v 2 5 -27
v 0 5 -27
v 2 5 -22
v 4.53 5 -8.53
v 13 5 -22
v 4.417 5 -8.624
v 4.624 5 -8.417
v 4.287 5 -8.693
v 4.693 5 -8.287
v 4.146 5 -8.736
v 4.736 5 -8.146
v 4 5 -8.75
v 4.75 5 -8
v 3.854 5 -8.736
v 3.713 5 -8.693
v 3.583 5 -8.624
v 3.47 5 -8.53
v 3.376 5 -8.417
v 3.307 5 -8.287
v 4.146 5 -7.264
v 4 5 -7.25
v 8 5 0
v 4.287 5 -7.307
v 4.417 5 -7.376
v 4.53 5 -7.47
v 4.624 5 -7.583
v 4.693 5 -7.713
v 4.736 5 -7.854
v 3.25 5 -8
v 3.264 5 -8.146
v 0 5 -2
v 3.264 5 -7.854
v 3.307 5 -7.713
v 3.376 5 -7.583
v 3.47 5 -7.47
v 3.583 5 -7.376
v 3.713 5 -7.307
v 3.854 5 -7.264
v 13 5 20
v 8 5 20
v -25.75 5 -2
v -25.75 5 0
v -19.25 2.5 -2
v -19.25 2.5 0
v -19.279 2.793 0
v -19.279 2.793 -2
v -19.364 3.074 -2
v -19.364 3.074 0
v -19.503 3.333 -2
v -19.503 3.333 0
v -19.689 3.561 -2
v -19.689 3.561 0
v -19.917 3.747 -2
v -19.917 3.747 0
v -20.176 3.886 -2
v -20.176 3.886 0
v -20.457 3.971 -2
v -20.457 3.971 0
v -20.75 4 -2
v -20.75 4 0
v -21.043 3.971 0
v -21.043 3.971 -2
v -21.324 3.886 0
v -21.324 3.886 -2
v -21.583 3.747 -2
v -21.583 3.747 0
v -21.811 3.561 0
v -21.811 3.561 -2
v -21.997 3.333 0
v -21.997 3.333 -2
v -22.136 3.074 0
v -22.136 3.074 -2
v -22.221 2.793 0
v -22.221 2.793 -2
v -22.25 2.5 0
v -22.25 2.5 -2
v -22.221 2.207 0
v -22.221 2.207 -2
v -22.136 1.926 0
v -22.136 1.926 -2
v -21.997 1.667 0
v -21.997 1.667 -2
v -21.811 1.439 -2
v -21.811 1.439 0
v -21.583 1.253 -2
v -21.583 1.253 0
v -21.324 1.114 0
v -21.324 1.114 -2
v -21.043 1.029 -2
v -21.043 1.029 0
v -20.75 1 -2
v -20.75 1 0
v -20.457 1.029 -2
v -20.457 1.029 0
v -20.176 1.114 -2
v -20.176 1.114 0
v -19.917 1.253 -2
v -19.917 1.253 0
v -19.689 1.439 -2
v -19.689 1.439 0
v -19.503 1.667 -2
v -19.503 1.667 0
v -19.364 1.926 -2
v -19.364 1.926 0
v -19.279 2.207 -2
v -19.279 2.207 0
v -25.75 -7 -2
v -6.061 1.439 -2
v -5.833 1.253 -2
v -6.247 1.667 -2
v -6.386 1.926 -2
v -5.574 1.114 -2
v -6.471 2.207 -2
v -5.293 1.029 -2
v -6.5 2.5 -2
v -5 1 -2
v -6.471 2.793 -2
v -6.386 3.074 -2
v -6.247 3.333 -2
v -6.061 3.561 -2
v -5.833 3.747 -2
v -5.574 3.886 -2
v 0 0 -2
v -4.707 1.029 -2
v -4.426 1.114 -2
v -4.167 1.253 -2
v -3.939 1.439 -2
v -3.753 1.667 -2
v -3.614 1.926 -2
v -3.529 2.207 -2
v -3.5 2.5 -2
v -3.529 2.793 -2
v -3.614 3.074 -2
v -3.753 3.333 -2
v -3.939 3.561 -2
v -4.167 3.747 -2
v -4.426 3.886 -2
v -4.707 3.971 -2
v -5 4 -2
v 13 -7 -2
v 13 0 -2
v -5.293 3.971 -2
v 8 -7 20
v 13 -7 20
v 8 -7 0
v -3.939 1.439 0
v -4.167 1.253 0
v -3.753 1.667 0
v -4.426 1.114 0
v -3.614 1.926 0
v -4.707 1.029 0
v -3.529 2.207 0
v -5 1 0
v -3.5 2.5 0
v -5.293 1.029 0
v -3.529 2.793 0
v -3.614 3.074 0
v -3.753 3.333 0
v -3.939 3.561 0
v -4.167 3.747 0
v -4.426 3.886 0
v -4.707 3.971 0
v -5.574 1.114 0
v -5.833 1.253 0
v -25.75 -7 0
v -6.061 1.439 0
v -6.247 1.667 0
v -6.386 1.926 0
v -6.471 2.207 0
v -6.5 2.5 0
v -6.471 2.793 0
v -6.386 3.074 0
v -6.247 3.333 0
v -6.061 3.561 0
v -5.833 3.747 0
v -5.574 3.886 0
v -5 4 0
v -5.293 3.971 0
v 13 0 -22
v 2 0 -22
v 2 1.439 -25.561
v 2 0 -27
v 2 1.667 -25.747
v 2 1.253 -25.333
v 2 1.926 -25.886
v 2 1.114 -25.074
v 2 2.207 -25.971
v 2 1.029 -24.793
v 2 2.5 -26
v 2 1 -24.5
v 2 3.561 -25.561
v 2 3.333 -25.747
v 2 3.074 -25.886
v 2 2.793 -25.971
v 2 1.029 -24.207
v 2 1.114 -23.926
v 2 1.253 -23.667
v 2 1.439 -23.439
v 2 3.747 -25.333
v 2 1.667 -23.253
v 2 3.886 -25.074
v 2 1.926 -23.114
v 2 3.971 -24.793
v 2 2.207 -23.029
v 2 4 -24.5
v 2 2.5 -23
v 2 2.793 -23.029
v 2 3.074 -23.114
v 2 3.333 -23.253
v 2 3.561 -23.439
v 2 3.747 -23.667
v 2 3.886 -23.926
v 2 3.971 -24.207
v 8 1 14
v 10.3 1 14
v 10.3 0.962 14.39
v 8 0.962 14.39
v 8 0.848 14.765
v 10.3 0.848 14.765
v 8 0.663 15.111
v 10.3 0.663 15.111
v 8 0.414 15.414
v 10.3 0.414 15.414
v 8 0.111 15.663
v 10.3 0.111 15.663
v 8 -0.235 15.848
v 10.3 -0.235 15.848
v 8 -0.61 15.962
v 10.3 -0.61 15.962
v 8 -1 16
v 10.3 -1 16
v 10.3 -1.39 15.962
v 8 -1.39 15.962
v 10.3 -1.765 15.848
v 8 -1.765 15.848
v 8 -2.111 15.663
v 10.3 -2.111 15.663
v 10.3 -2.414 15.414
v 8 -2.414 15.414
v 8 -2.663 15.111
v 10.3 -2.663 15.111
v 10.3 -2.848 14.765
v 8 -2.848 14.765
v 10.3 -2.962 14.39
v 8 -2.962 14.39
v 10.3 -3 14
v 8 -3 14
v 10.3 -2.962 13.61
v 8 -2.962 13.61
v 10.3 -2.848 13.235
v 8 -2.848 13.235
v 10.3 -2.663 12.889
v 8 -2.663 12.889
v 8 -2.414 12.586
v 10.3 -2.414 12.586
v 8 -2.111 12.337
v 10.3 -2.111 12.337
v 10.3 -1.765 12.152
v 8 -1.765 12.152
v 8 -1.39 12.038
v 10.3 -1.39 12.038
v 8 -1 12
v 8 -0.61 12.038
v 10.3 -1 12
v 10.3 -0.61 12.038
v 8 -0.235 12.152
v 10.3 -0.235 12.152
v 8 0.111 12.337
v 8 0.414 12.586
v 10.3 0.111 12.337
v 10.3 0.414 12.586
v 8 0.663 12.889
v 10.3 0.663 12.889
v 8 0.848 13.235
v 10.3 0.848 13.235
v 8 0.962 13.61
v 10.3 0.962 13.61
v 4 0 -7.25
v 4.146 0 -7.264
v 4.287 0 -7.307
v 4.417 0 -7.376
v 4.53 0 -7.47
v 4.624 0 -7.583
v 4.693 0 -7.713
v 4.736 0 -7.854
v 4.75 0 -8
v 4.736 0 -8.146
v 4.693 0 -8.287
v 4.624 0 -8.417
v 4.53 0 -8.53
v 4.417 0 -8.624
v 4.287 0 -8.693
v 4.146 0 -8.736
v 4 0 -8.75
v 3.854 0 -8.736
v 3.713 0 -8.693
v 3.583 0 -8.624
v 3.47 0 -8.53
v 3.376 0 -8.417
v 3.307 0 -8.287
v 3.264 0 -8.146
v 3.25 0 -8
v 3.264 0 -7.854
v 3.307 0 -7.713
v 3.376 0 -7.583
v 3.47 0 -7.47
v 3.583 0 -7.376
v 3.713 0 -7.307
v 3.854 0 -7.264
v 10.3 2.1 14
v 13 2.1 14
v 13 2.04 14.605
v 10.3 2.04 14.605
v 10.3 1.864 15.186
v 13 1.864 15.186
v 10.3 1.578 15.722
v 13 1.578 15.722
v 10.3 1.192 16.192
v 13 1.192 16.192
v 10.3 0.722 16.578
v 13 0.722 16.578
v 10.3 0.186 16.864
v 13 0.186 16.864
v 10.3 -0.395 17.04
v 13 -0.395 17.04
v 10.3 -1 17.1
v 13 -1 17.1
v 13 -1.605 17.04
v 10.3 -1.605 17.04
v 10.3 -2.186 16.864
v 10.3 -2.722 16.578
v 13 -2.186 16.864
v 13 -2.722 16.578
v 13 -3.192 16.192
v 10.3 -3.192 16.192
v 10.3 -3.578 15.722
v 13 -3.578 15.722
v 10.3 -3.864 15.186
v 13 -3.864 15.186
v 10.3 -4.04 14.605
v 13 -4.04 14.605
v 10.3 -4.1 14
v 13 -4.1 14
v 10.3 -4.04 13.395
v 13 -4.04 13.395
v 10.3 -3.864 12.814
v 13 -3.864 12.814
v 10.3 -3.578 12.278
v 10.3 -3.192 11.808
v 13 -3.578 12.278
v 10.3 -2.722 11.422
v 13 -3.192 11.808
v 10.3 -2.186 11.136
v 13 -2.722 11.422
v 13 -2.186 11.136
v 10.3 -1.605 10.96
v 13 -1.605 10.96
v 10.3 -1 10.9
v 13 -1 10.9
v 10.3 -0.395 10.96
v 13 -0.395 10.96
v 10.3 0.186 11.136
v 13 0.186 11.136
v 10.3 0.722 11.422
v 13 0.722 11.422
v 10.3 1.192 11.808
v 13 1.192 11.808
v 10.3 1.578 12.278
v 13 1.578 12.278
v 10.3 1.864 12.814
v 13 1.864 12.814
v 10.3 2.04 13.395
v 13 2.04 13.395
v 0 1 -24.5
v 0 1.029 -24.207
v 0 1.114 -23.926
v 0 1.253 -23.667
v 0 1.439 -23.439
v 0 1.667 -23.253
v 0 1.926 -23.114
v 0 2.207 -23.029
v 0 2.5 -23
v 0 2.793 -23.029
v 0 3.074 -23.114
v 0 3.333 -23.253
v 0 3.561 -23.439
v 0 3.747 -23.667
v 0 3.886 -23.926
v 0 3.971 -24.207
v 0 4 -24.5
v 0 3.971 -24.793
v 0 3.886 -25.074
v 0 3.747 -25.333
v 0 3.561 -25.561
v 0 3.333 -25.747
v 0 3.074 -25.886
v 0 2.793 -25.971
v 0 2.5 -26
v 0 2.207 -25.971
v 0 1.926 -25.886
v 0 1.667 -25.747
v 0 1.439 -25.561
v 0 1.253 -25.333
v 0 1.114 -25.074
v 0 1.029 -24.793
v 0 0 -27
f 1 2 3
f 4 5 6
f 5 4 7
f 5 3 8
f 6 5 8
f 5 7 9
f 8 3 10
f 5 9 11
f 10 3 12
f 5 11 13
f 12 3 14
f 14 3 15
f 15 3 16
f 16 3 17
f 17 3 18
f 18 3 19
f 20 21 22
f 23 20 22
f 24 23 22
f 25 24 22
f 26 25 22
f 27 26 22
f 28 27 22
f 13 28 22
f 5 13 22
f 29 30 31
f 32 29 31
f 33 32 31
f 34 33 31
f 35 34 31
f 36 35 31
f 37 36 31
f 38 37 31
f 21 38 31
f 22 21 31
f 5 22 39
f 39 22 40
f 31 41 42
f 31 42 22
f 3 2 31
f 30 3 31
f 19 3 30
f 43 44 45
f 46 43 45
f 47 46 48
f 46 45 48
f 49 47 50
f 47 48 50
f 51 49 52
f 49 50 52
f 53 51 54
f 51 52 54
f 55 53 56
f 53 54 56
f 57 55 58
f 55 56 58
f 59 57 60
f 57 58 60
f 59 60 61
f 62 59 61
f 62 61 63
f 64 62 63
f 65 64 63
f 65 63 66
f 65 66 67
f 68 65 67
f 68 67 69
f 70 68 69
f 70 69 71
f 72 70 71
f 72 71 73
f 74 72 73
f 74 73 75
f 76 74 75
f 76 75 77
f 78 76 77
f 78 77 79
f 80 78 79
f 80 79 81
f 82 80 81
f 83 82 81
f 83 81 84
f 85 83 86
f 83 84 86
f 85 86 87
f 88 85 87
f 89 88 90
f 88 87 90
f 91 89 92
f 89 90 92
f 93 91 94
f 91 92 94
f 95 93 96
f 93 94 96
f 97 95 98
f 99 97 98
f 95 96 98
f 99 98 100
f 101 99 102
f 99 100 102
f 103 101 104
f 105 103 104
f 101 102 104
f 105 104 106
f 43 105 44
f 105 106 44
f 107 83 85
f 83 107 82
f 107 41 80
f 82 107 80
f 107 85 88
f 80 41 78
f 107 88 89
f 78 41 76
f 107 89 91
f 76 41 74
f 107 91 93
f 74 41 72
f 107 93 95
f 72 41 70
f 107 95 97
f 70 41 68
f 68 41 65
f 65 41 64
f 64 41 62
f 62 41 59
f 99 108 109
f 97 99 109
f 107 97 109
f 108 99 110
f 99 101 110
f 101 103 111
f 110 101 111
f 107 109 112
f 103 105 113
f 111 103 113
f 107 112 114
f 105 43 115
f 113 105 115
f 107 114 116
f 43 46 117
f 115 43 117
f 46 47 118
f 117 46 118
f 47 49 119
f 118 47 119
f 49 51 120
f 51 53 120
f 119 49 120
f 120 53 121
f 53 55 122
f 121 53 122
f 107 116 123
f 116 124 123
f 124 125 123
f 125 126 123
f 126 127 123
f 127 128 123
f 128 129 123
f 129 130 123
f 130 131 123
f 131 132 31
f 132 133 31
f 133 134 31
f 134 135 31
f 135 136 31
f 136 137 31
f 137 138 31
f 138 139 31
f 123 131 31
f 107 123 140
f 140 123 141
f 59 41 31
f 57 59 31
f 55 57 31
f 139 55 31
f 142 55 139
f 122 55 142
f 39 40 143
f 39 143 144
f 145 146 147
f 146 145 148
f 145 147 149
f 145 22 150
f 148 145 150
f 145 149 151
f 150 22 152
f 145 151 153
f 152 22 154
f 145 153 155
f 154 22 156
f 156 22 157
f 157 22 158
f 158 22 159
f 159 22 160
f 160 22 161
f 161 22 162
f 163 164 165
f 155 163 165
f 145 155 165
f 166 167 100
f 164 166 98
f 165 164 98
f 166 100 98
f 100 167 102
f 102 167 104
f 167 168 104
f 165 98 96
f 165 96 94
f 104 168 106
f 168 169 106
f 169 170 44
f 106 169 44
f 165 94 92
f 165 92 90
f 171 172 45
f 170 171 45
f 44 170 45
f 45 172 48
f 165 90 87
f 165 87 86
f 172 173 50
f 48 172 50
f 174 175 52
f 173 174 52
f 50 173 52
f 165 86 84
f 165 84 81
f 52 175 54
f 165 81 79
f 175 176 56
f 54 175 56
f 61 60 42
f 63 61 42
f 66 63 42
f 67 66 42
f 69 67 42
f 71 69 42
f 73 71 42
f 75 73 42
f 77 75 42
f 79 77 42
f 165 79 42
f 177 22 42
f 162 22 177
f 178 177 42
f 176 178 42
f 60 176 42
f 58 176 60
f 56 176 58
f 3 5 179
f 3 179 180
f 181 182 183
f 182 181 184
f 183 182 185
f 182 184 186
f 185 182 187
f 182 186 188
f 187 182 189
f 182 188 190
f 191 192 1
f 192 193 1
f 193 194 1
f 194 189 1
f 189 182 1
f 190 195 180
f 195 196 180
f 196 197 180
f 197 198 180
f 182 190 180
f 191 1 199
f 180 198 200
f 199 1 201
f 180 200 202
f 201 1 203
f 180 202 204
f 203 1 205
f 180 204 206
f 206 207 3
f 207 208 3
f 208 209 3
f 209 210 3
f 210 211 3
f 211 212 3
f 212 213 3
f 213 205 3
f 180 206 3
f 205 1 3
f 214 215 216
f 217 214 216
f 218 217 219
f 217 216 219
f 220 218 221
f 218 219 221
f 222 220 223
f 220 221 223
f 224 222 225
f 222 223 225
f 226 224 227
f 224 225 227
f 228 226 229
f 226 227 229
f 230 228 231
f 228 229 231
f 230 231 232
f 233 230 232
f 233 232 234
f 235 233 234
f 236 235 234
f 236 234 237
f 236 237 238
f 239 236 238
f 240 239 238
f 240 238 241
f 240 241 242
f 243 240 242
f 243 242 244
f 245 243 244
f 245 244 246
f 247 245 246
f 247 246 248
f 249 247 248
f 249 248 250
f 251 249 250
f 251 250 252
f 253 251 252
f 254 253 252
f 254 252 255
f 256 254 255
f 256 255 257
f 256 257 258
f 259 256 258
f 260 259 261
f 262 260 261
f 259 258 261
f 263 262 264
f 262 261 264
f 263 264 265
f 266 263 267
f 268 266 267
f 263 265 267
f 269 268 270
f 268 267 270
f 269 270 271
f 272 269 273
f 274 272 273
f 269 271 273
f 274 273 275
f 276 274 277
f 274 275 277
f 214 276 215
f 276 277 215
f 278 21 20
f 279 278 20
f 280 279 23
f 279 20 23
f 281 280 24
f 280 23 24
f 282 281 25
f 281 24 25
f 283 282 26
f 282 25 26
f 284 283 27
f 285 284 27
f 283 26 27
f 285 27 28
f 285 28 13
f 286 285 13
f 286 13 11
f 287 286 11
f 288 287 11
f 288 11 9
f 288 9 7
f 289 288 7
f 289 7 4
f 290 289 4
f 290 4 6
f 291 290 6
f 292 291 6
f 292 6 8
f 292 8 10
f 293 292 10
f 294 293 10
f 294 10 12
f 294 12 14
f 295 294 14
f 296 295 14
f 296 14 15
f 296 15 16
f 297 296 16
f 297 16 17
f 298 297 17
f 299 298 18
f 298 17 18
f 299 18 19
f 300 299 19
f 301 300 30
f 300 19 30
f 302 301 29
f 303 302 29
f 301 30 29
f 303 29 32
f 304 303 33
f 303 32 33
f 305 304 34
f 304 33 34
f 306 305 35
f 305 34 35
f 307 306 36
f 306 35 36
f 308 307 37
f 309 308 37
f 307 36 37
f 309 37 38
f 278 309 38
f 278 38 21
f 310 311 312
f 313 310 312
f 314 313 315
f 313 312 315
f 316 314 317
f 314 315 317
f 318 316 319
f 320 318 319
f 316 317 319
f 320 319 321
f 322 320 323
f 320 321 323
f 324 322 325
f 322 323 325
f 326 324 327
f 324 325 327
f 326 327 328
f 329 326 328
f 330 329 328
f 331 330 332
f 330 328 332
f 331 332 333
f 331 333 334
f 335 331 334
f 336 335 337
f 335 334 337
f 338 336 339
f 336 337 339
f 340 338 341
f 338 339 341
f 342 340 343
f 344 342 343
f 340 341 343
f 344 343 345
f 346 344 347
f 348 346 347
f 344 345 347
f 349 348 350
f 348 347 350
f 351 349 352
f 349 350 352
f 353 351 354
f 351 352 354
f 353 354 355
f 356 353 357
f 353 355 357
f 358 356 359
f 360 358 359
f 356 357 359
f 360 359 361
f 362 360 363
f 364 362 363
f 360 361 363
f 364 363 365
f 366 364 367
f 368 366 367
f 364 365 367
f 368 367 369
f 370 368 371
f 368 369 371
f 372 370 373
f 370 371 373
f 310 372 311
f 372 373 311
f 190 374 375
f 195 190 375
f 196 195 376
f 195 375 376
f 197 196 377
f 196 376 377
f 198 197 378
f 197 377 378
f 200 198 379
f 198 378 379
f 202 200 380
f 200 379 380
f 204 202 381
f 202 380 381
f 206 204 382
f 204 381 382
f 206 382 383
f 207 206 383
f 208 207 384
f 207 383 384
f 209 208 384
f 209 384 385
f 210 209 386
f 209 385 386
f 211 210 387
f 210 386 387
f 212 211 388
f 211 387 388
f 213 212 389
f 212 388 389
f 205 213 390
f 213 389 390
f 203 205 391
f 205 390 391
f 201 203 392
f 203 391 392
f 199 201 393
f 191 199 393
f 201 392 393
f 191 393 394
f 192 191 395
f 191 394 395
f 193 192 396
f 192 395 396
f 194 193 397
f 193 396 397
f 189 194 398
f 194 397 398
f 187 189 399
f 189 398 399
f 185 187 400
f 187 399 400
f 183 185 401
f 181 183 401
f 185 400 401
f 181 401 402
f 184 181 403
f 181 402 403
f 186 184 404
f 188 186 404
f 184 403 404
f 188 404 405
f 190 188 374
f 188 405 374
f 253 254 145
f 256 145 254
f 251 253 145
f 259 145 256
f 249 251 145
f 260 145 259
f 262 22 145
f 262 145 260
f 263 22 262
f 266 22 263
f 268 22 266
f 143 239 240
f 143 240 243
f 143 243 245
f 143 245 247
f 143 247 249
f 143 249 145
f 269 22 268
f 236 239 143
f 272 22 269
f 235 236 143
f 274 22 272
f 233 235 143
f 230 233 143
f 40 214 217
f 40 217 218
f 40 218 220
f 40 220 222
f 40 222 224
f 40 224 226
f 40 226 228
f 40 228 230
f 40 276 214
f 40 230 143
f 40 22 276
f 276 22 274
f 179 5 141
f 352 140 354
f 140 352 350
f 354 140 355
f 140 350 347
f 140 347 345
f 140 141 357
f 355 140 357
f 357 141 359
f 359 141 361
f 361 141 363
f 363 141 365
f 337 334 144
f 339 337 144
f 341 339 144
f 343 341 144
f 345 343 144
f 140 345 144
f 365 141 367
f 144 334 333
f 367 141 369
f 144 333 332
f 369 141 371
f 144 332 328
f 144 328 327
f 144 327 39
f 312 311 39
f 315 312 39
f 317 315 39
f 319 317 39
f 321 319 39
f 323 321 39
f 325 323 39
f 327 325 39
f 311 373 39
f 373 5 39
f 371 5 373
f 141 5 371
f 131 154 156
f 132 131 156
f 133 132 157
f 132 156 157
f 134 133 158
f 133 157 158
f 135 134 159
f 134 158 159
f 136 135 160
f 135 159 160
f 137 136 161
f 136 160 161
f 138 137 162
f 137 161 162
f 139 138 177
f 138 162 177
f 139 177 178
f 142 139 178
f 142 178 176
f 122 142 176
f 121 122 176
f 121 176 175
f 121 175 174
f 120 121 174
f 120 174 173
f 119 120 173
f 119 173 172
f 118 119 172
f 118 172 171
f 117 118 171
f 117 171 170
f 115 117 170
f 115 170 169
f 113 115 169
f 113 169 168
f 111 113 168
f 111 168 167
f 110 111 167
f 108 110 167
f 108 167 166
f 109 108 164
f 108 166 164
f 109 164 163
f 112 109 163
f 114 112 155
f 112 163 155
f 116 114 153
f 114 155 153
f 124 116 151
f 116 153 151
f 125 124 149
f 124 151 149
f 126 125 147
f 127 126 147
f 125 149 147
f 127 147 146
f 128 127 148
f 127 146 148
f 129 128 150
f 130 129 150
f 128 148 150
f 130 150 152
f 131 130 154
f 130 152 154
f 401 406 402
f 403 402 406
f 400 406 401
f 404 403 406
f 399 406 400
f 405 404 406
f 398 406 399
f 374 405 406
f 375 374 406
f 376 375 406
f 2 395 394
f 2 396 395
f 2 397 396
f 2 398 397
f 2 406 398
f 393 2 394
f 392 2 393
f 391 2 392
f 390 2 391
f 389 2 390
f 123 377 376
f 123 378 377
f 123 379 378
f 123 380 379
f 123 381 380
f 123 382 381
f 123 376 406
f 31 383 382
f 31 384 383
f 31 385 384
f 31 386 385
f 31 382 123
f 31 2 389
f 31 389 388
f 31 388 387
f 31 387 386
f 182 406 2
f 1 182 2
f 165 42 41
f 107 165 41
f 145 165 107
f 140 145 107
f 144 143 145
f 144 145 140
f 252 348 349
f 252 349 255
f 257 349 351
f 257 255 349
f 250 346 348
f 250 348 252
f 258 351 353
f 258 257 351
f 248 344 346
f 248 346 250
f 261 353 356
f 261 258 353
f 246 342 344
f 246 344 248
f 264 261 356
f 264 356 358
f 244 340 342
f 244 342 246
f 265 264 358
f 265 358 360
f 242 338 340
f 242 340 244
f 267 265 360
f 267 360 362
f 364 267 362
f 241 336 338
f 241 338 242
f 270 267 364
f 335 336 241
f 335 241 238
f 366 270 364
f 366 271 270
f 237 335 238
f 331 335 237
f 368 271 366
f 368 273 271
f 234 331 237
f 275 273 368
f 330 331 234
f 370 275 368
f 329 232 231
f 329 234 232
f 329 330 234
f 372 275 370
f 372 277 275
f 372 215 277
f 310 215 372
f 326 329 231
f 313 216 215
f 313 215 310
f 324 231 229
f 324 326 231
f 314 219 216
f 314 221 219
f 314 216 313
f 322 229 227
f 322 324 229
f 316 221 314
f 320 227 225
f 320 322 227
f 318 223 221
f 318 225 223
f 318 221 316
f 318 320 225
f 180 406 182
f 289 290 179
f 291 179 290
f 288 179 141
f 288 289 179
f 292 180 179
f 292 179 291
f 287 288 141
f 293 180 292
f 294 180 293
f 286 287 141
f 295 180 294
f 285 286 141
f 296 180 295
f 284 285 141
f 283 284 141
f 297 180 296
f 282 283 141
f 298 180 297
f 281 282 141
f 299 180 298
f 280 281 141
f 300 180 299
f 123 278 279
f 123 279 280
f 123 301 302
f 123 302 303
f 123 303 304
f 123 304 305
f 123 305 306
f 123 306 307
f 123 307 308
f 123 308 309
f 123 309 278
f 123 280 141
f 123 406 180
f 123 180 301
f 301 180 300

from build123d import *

# Parameters (mm, degrees)
SKETCH_1_W          = 25.75
SKETCH_1_H          = 2
EXTRUDE_1_DEPTH     = 5
SKETCH_2_W          = 13
SKETCH_2_H          = 5
EXTRUDE_2_DEPTH     = 22
SKETCH_2_3_W        = 5
SKETCH_2_3_H        = 5
EXTRUDE_3_DEPTH     = 20
SKETCH_3_W          = 5
SKETCH_3_H          = 20
EXTRUDE_4_DEPTH     = 7
SKETCH_4_R          = 2
CUT_EXTRUDE_1_DEPTH = 46.106124861
SKETCH_4_3_R        = 3.1
CUT_EXTRUDE_2_DEPTH = 2.7
SKETCH_5_W          = 5
SKETCH_5_H          = 5
SKETCH_5_R          = 1.5
EXTRUDE_5_DEPTH     = 2
SKETCH_6_R          = 1.5
CUT_EXTRUDE_3_DEPTH = 38.961329007
SKETCH_7_R          = 0.75
CUT_EXTRUDE_4_DEPTH = 40.192633236


with BuildPart() as part:
    # 草图1 → 凸台-拉伸1 (new body)
    with BuildSketch(Plane(origin=(0, 0, 0), x_dir=(1, 0, 0), z_dir=(0, 1, 0))):
        with Locations((-12.875, 1)):
            Rectangle(SKETCH_1_W, SKETCH_1_H)
    extrude(amount=EXTRUDE_1_DEPTH)

    # 草图2 → 凸台-拉伸2 (add)
    with BuildSketch(Plane(origin=(0, 0, 0), x_dir=(-1, 0, 0), z_dir=(0, 0, -1))):
        with Locations((-6.5, 2.5)):
            Rectangle(SKETCH_2_W, SKETCH_2_H)
    extrude(amount=EXTRUDE_2_DEPTH)

    # 草图2<3> → 凸台-拉伸3 (add)
    with BuildSketch(Plane(origin=(0, 0, 0), x_dir=(-1, 0, 0), z_dir=(0, 0, -1))):
        with Locations((-10.5, 2.5)):
            Rectangle(SKETCH_2_3_W, SKETCH_2_3_H)
    extrude(amount=-EXTRUDE_3_DEPTH)

    # 草图3 → 凸台-拉伸4 (add)
    with BuildSketch(Plane.XZ):
        Polygon((8, 0), (-25.75, 0), (-25.75, -2), (13, -2), (13, 0), align=None)
        with Locations((10.5, 10)):
            Rectangle(SKETCH_3_W, SKETCH_3_H)
    extrude(amount=EXTRUDE_4_DEPTH)

    # 草图4 → 切除-拉伸1 (cut, through all)
    with BuildSketch(Plane(origin=(13, 0, 0), x_dir=(0, 0, -1), z_dir=(1, 0, 0))):
        with Locations((-14, -1)):
            Circle(SKETCH_4_R)
    extrude(amount=-CUT_EXTRUDE_1_DEPTH, mode=Mode.SUBTRACT)

    # 草图4<3> → 切除-拉伸2 (cut)
    with BuildSketch(Plane(origin=(13, 0, 0), x_dir=(0, 0, -1), z_dir=(1, 0, 0))):
        with Locations((-14, -1)):
            Circle(SKETCH_4_3_R)
    extrude(amount=-CUT_EXTRUDE_2_DEPTH, mode=Mode.SUBTRACT)

    # 草图5 → 凸台-拉伸5 (add)
    with BuildSketch(Plane.ZY):
        with Locations((-24.5, 2.5)):
            Rectangle(SKETCH_5_W, SKETCH_5_H)
        with Locations((-24.5, 2.5)):
            Circle(SKETCH_5_R, mode=Mode.SUBTRACT)
    extrude(amount=-EXTRUDE_5_DEPTH)

    # 草图6 → 切除-拉伸3 (cut, through all)
    with BuildSketch(Plane.XY):
        with Locations((-20.75, 2.5)):
            Circle(SKETCH_6_R)
        with Locations((-5, 2.5)):
            Circle(SKETCH_6_R)
    extrude(amount=-CUT_EXTRUDE_3_DEPTH, mode=Mode.SUBTRACT)

    # 草图7 → 切除-拉伸4 (cut, through all)
    with BuildSketch(Plane(origin=(0, 5, 0), x_dir=(1, 0, 0), z_dir=(0, 1, 0))):
        with Locations((4, 8)):
            Circle(SKETCH_7_R)
    extrude(amount=-CUT_EXTRUDE_4_DEPTH, mode=Mode.SUBTRACT)


solid = part.part
